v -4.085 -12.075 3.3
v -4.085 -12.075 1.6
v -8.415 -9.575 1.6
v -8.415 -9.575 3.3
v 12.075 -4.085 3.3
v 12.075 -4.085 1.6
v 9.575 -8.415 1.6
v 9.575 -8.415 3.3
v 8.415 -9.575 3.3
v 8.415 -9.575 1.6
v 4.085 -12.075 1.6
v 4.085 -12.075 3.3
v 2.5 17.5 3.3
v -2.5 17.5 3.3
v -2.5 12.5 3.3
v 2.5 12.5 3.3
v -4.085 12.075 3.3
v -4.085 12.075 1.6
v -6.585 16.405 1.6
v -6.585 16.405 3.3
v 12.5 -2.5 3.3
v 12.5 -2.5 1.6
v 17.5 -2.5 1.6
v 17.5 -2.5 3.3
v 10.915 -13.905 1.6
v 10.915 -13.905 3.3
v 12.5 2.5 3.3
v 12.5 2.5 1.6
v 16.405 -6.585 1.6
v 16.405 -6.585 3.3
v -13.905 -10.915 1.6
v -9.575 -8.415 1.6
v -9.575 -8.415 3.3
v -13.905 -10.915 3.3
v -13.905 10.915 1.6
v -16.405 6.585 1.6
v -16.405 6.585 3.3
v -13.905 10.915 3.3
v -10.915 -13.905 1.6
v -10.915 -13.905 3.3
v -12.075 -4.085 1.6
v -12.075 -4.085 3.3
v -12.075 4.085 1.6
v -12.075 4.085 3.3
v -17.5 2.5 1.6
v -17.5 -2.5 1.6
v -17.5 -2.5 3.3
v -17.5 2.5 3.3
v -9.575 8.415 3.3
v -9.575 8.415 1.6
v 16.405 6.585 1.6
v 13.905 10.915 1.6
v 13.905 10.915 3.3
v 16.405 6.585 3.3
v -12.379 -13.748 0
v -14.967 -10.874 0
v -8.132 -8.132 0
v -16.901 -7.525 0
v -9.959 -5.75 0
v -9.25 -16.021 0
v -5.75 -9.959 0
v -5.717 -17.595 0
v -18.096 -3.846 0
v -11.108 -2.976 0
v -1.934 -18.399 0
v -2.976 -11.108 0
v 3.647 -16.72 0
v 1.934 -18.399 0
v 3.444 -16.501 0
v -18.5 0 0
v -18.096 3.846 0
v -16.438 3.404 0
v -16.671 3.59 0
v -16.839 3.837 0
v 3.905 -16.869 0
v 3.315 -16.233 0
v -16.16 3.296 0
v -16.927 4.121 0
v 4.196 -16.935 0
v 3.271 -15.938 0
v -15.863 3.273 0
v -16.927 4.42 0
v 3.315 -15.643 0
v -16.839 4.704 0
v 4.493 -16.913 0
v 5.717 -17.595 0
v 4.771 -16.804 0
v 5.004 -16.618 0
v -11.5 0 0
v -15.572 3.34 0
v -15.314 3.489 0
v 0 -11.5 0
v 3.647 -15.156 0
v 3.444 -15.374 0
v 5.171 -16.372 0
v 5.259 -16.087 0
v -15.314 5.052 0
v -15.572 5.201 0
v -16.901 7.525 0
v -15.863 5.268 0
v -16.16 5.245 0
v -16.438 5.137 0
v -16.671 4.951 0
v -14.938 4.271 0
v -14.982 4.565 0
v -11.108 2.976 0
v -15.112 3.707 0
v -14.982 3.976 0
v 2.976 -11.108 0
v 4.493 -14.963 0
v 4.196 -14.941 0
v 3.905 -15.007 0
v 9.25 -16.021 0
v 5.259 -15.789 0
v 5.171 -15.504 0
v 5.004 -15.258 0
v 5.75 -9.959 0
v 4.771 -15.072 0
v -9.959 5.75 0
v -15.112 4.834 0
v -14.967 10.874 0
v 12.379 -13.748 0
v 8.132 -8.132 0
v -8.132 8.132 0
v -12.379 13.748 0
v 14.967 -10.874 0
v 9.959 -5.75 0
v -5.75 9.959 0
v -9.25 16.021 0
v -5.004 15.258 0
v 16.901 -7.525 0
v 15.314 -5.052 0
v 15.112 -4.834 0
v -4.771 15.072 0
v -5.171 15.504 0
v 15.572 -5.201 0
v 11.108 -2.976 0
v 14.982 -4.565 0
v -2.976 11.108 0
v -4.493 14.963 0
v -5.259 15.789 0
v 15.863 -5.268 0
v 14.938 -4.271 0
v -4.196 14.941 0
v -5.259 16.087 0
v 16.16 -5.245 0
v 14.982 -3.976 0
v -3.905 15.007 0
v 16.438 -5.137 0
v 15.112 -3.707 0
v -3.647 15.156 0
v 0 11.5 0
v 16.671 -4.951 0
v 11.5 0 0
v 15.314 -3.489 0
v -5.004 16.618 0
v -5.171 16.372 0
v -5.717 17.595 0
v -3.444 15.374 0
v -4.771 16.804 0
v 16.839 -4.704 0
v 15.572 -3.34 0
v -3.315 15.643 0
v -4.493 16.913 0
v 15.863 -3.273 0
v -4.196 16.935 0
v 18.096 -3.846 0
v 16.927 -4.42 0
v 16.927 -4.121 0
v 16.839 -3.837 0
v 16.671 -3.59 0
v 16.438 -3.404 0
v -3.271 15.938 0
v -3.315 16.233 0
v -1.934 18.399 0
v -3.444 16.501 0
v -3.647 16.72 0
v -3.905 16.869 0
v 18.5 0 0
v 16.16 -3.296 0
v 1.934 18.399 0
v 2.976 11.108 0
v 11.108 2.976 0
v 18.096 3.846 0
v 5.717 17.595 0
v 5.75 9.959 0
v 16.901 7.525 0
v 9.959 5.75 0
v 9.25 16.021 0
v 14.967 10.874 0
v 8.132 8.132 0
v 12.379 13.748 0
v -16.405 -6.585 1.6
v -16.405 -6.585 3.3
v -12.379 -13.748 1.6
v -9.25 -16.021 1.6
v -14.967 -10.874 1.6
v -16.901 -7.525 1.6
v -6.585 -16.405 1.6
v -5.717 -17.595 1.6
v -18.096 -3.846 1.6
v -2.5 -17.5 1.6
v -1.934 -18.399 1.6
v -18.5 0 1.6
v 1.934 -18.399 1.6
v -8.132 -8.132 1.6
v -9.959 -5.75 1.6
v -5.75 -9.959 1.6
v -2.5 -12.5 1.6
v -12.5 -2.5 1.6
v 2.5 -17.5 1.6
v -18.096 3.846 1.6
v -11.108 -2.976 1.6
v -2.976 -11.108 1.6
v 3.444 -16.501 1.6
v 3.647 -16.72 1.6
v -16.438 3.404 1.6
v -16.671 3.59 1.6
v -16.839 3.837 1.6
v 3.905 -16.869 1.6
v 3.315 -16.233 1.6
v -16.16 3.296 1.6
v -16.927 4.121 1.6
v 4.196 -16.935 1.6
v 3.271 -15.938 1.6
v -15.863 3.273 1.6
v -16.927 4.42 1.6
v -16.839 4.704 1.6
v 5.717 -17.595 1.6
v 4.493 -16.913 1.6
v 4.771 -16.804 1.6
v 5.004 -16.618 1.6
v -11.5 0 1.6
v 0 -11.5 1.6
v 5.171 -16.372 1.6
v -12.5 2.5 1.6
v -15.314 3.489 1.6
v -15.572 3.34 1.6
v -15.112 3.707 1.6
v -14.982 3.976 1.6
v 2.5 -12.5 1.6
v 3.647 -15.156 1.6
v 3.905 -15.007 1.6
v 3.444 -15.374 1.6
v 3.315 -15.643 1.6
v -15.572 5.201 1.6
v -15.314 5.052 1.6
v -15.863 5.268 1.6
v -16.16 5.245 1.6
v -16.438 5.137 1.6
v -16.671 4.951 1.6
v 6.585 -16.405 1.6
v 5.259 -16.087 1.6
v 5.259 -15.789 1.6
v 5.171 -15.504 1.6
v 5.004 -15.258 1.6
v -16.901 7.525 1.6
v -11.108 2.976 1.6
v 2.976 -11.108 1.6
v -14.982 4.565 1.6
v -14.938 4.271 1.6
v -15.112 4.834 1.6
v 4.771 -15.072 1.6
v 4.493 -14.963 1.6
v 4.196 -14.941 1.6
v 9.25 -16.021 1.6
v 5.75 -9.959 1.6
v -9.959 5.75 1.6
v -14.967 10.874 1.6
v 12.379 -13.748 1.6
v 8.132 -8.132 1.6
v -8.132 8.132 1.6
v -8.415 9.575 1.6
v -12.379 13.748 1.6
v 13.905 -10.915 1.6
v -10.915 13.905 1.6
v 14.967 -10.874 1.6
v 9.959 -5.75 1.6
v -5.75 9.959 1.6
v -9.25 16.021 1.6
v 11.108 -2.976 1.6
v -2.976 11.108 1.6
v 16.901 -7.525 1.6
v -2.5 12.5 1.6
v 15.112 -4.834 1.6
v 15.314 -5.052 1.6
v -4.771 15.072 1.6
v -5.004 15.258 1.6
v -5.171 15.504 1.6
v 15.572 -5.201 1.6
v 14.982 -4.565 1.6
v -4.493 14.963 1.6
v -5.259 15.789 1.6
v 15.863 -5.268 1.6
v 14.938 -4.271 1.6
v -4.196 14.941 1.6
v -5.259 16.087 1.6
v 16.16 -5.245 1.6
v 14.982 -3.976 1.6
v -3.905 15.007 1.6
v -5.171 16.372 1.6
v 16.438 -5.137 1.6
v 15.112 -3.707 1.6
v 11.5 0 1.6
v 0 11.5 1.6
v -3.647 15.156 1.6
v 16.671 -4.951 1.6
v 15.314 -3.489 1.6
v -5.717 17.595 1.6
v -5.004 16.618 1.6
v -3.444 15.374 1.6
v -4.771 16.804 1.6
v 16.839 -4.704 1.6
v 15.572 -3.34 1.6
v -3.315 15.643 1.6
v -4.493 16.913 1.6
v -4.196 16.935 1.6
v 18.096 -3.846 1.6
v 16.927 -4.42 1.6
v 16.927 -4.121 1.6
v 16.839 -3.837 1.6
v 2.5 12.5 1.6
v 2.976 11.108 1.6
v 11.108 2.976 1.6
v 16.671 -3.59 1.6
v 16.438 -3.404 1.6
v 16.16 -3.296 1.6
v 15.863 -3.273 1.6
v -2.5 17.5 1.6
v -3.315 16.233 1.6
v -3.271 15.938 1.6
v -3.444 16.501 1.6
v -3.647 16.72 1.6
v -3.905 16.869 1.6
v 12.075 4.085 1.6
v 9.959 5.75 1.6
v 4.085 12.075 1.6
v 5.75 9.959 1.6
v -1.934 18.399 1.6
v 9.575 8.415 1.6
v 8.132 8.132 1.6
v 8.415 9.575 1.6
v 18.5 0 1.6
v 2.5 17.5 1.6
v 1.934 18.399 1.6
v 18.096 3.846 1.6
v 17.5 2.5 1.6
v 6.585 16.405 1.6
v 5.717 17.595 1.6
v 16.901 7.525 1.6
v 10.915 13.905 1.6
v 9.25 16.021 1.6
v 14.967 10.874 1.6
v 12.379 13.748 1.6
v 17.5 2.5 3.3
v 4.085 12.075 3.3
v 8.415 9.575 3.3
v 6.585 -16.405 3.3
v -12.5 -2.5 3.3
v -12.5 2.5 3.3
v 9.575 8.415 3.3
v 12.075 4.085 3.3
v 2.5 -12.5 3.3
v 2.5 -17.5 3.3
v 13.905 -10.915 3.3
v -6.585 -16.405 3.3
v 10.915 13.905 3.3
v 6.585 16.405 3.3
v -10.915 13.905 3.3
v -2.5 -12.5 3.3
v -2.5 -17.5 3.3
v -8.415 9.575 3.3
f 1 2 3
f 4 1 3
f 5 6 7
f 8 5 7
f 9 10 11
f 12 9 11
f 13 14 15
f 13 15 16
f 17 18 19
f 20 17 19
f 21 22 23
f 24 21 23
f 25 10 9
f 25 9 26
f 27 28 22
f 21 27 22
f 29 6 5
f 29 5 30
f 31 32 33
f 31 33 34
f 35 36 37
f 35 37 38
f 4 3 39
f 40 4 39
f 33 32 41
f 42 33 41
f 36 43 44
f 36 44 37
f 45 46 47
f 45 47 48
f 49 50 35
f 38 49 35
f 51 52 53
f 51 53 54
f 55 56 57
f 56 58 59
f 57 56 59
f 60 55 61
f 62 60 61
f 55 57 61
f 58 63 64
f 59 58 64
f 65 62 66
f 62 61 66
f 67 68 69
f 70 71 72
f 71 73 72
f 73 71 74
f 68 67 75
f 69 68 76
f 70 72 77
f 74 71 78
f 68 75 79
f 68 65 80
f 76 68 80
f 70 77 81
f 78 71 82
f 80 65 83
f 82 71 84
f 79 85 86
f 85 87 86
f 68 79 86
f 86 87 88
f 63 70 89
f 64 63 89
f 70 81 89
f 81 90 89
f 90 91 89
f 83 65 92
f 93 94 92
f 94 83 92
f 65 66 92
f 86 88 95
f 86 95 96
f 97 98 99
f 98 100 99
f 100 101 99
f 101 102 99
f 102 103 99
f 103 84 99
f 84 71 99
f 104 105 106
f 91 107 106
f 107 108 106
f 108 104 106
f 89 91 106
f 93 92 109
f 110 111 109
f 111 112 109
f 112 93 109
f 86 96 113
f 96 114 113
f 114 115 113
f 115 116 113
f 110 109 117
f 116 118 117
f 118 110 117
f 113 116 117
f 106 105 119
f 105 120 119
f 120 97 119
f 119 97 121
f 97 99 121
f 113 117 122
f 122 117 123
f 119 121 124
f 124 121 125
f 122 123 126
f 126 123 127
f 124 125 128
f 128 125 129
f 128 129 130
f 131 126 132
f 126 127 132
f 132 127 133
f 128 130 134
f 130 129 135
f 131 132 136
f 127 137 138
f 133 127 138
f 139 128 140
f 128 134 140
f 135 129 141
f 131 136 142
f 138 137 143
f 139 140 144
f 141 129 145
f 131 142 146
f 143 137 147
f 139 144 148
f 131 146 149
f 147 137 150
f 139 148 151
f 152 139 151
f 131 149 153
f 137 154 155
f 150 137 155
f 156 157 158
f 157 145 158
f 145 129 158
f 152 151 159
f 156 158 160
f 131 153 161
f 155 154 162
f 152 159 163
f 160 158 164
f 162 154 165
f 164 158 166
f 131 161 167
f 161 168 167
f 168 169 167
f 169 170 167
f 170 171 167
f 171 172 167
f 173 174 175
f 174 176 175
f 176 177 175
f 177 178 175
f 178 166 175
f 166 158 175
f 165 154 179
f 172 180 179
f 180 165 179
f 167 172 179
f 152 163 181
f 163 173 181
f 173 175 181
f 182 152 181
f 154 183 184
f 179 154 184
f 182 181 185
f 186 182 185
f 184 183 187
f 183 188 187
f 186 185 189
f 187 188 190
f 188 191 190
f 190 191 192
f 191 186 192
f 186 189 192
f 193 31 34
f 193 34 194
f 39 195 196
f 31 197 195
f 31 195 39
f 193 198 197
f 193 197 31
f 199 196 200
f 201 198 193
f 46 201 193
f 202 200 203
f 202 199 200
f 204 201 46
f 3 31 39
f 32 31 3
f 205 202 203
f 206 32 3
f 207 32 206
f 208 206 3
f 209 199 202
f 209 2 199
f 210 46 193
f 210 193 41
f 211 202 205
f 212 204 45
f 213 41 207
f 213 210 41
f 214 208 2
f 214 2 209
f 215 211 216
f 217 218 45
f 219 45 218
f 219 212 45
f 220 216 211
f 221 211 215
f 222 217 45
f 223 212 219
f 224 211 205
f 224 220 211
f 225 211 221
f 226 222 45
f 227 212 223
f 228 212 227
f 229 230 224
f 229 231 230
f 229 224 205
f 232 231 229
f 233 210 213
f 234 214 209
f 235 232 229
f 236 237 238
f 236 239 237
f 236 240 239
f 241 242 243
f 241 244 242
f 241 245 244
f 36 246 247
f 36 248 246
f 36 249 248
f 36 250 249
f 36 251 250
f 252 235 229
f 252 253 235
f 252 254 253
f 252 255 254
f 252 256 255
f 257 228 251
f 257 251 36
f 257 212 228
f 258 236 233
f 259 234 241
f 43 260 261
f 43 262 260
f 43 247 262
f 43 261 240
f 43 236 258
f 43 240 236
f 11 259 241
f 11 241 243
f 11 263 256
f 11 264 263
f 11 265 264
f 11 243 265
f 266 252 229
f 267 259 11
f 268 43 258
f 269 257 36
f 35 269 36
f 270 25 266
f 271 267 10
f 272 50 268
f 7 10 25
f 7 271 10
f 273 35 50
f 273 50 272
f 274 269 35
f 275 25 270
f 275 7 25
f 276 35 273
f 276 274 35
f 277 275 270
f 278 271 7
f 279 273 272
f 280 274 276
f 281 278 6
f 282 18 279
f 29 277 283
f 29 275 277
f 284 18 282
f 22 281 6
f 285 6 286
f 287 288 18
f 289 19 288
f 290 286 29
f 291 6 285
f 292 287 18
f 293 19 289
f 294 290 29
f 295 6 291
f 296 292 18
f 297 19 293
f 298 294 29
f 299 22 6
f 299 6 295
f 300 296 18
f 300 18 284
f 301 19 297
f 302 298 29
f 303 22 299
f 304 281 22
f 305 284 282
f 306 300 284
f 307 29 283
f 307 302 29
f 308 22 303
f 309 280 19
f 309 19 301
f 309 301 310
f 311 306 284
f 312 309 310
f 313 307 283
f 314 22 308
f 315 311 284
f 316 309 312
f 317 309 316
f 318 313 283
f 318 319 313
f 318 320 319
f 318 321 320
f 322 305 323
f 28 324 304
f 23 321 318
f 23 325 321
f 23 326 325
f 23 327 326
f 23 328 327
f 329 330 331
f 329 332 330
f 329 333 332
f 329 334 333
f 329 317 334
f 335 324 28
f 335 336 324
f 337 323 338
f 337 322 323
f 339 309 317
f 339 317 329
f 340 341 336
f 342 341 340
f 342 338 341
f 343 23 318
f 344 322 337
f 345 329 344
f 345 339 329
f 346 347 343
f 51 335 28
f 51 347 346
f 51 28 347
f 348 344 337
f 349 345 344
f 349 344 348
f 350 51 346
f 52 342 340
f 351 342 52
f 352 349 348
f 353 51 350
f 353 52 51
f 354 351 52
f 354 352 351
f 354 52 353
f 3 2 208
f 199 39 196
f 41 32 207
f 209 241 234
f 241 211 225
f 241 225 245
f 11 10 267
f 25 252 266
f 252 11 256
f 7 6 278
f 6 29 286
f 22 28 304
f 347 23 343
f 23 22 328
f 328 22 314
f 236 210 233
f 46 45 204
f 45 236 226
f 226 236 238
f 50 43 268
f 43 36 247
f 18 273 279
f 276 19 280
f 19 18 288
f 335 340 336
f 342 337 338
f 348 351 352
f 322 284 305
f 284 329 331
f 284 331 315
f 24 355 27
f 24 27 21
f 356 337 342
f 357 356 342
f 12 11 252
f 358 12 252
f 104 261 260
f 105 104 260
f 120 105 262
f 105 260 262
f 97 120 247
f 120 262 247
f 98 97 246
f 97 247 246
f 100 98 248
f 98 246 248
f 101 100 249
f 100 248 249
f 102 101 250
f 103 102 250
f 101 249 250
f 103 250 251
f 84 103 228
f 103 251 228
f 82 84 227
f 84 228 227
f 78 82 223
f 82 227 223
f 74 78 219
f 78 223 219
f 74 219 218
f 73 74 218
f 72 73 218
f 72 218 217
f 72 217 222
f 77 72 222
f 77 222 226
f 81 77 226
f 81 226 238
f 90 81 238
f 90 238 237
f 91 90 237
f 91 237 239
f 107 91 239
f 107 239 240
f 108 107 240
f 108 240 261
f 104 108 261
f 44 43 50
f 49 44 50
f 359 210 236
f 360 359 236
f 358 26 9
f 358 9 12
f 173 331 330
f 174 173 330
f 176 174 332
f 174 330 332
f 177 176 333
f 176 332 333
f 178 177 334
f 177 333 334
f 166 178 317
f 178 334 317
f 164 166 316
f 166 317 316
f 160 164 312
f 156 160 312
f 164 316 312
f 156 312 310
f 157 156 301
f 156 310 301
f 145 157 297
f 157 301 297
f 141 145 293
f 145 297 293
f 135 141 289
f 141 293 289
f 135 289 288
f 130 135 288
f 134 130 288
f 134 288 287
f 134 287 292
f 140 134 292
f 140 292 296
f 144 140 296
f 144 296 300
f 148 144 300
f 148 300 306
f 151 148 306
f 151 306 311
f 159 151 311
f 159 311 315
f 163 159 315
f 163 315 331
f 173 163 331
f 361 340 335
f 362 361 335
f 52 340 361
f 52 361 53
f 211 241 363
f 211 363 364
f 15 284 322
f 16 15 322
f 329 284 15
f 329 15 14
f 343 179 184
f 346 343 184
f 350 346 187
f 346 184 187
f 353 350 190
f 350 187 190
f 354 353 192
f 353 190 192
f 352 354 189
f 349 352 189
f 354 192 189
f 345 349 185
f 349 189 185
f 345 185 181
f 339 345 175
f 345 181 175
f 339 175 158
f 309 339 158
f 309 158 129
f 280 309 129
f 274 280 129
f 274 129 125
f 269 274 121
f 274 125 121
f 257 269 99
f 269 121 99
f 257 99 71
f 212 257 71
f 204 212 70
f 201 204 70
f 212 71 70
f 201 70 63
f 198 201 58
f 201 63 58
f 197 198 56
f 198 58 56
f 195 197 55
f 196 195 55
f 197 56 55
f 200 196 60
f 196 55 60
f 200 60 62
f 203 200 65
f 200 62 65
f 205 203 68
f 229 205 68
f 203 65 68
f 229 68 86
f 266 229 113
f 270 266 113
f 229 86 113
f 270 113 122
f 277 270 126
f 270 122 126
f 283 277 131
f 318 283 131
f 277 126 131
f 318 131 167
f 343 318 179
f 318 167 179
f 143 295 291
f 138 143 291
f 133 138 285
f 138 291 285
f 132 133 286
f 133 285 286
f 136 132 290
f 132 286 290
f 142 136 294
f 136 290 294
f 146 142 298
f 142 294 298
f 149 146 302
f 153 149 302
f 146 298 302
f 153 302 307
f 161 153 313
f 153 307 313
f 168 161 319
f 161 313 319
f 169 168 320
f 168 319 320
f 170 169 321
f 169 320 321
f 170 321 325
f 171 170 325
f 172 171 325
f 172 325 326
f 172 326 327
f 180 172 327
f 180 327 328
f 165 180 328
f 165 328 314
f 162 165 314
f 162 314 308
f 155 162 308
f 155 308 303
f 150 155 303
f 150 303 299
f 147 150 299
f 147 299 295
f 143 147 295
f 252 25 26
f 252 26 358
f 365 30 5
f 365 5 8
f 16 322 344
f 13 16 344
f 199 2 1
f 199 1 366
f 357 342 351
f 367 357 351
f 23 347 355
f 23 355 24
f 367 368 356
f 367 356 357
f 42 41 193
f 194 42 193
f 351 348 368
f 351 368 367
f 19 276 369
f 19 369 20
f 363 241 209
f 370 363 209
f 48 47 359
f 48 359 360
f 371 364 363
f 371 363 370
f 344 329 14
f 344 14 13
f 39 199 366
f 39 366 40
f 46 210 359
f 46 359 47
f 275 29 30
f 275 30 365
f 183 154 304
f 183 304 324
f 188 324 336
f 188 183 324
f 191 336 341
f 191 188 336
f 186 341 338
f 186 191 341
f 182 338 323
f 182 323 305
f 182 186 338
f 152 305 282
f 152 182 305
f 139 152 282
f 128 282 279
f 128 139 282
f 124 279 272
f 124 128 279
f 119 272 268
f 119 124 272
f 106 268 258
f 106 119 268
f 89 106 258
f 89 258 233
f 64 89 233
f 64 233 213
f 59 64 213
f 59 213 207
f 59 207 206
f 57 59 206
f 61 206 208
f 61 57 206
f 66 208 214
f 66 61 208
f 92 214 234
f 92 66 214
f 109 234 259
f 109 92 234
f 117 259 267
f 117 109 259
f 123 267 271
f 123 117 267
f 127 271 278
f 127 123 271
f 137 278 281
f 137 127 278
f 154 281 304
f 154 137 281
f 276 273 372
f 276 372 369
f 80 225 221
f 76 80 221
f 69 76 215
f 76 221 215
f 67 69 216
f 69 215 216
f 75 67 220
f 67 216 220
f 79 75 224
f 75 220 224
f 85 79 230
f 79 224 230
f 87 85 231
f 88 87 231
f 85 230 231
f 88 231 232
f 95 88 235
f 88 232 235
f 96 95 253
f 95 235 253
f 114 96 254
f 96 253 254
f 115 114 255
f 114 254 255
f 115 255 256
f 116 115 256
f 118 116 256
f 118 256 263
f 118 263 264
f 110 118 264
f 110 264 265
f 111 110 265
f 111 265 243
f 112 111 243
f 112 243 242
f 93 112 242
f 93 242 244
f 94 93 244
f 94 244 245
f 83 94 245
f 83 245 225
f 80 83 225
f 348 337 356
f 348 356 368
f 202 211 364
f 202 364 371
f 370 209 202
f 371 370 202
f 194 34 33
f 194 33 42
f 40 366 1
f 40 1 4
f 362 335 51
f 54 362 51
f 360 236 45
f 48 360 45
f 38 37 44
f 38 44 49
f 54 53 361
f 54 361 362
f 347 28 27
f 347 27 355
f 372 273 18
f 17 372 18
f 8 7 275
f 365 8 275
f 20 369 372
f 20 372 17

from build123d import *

# Parameters (mm, degrees)
SKETCH1_R           = 18.5
SKETCH1_R_2         = 11.5
BOSS_EXTRUDE1_DEPTH = 1.6
SKETCH2_W           = 5
SKETCH2_H           = 5
BOSS_EXTRUDE2_DEPTH = 1.7
CIRPATTERN1_COUNT   = 12
SKETCH3_R           = 1
CUT_EXTRUDE1_DEPTH  = 2
CIRPATTERN2_COUNT   = 2
SKETCH4_R           = 1
CUT_EXTRUDE2_DEPTH  = 10
CIRPATTERN3_COUNT   = 2


with BuildPart() as part:
    # Sketch1 → Boss-Extrude1 (new body)
    with BuildSketch(Plane.XY):
        Circle(SKETCH1_R)
        Circle(SKETCH1_R_2, mode=Mode.SUBTRACT)
    extrude(amount=BOSS_EXTRUDE1_DEPTH)

    # Sketch2 → Boss-Extrude2 (add)
    with BuildSketch(Plane.XY.offset(1.6)):
        with Locations((0, 15)):
            Rectangle(SKETCH2_W, SKETCH2_H)
    boss_extrude2 = extrude(amount=BOSS_EXTRUDE2_DEPTH)

    # CirPattern1: Boss-Extrude2 ×12 about axis
    cirpattern1_axis = Axis((0, 0, 1.6), (0, 0, -1))
    for i in range(1, CIRPATTERN1_COUNT):
        add(boss_extrude2.rotate(cirpattern1_axis, i * 360 / CIRPATTERN1_COUNT))

    # Sketch3 → Cut-Extrude1 (cut)
    with BuildSketch(Plane.XY.offset(1.6)):
        with Locations((-4.270514244, 15.937776134)):
            Circle(SKETCH3_R)
    cut_extrude1 = extrude(amount=-CUT_EXTRUDE1_DEPTH, mode=Mode.SUBTRACT)

    # CirPattern2: Cut-Extrude1 ×2 about axis
    cirpattern2_axis = Axis((0, 0, 1.6), (0, 0, -1))
    for i in range(1, CIRPATTERN2_COUNT):
        add(cut_extrude1.rotate(cirpattern2_axis, i * 360 / CIRPATTERN2_COUNT), mode=Mode.SUBTRACT)

    # Sketch4 → Cut-Extrude2 (cut)
    with BuildSketch(Plane.XY.offset(1.6)):
        with Locations((-15.937776134, 4.270514244)):
            Circle(SKETCH4_R)
    cut_extrude2 = extrude(amount=-CUT_EXTRUDE2_DEPTH, mode=Mode.SUBTRACT)

    # CirPattern3: Cut-Extrude2 ×2 about axis
    cirpattern3_axis = Axis((0, 0, 1.6), (0, 0, -1))
    for i in range(1, CIRPATTERN3_COUNT):
        add(cut_extrude2.rotate(cirpattern3_axis, i * 360 / CIRPATTERN3_COUNT), mode=Mode.SUBTRACT)


solid = part.part
